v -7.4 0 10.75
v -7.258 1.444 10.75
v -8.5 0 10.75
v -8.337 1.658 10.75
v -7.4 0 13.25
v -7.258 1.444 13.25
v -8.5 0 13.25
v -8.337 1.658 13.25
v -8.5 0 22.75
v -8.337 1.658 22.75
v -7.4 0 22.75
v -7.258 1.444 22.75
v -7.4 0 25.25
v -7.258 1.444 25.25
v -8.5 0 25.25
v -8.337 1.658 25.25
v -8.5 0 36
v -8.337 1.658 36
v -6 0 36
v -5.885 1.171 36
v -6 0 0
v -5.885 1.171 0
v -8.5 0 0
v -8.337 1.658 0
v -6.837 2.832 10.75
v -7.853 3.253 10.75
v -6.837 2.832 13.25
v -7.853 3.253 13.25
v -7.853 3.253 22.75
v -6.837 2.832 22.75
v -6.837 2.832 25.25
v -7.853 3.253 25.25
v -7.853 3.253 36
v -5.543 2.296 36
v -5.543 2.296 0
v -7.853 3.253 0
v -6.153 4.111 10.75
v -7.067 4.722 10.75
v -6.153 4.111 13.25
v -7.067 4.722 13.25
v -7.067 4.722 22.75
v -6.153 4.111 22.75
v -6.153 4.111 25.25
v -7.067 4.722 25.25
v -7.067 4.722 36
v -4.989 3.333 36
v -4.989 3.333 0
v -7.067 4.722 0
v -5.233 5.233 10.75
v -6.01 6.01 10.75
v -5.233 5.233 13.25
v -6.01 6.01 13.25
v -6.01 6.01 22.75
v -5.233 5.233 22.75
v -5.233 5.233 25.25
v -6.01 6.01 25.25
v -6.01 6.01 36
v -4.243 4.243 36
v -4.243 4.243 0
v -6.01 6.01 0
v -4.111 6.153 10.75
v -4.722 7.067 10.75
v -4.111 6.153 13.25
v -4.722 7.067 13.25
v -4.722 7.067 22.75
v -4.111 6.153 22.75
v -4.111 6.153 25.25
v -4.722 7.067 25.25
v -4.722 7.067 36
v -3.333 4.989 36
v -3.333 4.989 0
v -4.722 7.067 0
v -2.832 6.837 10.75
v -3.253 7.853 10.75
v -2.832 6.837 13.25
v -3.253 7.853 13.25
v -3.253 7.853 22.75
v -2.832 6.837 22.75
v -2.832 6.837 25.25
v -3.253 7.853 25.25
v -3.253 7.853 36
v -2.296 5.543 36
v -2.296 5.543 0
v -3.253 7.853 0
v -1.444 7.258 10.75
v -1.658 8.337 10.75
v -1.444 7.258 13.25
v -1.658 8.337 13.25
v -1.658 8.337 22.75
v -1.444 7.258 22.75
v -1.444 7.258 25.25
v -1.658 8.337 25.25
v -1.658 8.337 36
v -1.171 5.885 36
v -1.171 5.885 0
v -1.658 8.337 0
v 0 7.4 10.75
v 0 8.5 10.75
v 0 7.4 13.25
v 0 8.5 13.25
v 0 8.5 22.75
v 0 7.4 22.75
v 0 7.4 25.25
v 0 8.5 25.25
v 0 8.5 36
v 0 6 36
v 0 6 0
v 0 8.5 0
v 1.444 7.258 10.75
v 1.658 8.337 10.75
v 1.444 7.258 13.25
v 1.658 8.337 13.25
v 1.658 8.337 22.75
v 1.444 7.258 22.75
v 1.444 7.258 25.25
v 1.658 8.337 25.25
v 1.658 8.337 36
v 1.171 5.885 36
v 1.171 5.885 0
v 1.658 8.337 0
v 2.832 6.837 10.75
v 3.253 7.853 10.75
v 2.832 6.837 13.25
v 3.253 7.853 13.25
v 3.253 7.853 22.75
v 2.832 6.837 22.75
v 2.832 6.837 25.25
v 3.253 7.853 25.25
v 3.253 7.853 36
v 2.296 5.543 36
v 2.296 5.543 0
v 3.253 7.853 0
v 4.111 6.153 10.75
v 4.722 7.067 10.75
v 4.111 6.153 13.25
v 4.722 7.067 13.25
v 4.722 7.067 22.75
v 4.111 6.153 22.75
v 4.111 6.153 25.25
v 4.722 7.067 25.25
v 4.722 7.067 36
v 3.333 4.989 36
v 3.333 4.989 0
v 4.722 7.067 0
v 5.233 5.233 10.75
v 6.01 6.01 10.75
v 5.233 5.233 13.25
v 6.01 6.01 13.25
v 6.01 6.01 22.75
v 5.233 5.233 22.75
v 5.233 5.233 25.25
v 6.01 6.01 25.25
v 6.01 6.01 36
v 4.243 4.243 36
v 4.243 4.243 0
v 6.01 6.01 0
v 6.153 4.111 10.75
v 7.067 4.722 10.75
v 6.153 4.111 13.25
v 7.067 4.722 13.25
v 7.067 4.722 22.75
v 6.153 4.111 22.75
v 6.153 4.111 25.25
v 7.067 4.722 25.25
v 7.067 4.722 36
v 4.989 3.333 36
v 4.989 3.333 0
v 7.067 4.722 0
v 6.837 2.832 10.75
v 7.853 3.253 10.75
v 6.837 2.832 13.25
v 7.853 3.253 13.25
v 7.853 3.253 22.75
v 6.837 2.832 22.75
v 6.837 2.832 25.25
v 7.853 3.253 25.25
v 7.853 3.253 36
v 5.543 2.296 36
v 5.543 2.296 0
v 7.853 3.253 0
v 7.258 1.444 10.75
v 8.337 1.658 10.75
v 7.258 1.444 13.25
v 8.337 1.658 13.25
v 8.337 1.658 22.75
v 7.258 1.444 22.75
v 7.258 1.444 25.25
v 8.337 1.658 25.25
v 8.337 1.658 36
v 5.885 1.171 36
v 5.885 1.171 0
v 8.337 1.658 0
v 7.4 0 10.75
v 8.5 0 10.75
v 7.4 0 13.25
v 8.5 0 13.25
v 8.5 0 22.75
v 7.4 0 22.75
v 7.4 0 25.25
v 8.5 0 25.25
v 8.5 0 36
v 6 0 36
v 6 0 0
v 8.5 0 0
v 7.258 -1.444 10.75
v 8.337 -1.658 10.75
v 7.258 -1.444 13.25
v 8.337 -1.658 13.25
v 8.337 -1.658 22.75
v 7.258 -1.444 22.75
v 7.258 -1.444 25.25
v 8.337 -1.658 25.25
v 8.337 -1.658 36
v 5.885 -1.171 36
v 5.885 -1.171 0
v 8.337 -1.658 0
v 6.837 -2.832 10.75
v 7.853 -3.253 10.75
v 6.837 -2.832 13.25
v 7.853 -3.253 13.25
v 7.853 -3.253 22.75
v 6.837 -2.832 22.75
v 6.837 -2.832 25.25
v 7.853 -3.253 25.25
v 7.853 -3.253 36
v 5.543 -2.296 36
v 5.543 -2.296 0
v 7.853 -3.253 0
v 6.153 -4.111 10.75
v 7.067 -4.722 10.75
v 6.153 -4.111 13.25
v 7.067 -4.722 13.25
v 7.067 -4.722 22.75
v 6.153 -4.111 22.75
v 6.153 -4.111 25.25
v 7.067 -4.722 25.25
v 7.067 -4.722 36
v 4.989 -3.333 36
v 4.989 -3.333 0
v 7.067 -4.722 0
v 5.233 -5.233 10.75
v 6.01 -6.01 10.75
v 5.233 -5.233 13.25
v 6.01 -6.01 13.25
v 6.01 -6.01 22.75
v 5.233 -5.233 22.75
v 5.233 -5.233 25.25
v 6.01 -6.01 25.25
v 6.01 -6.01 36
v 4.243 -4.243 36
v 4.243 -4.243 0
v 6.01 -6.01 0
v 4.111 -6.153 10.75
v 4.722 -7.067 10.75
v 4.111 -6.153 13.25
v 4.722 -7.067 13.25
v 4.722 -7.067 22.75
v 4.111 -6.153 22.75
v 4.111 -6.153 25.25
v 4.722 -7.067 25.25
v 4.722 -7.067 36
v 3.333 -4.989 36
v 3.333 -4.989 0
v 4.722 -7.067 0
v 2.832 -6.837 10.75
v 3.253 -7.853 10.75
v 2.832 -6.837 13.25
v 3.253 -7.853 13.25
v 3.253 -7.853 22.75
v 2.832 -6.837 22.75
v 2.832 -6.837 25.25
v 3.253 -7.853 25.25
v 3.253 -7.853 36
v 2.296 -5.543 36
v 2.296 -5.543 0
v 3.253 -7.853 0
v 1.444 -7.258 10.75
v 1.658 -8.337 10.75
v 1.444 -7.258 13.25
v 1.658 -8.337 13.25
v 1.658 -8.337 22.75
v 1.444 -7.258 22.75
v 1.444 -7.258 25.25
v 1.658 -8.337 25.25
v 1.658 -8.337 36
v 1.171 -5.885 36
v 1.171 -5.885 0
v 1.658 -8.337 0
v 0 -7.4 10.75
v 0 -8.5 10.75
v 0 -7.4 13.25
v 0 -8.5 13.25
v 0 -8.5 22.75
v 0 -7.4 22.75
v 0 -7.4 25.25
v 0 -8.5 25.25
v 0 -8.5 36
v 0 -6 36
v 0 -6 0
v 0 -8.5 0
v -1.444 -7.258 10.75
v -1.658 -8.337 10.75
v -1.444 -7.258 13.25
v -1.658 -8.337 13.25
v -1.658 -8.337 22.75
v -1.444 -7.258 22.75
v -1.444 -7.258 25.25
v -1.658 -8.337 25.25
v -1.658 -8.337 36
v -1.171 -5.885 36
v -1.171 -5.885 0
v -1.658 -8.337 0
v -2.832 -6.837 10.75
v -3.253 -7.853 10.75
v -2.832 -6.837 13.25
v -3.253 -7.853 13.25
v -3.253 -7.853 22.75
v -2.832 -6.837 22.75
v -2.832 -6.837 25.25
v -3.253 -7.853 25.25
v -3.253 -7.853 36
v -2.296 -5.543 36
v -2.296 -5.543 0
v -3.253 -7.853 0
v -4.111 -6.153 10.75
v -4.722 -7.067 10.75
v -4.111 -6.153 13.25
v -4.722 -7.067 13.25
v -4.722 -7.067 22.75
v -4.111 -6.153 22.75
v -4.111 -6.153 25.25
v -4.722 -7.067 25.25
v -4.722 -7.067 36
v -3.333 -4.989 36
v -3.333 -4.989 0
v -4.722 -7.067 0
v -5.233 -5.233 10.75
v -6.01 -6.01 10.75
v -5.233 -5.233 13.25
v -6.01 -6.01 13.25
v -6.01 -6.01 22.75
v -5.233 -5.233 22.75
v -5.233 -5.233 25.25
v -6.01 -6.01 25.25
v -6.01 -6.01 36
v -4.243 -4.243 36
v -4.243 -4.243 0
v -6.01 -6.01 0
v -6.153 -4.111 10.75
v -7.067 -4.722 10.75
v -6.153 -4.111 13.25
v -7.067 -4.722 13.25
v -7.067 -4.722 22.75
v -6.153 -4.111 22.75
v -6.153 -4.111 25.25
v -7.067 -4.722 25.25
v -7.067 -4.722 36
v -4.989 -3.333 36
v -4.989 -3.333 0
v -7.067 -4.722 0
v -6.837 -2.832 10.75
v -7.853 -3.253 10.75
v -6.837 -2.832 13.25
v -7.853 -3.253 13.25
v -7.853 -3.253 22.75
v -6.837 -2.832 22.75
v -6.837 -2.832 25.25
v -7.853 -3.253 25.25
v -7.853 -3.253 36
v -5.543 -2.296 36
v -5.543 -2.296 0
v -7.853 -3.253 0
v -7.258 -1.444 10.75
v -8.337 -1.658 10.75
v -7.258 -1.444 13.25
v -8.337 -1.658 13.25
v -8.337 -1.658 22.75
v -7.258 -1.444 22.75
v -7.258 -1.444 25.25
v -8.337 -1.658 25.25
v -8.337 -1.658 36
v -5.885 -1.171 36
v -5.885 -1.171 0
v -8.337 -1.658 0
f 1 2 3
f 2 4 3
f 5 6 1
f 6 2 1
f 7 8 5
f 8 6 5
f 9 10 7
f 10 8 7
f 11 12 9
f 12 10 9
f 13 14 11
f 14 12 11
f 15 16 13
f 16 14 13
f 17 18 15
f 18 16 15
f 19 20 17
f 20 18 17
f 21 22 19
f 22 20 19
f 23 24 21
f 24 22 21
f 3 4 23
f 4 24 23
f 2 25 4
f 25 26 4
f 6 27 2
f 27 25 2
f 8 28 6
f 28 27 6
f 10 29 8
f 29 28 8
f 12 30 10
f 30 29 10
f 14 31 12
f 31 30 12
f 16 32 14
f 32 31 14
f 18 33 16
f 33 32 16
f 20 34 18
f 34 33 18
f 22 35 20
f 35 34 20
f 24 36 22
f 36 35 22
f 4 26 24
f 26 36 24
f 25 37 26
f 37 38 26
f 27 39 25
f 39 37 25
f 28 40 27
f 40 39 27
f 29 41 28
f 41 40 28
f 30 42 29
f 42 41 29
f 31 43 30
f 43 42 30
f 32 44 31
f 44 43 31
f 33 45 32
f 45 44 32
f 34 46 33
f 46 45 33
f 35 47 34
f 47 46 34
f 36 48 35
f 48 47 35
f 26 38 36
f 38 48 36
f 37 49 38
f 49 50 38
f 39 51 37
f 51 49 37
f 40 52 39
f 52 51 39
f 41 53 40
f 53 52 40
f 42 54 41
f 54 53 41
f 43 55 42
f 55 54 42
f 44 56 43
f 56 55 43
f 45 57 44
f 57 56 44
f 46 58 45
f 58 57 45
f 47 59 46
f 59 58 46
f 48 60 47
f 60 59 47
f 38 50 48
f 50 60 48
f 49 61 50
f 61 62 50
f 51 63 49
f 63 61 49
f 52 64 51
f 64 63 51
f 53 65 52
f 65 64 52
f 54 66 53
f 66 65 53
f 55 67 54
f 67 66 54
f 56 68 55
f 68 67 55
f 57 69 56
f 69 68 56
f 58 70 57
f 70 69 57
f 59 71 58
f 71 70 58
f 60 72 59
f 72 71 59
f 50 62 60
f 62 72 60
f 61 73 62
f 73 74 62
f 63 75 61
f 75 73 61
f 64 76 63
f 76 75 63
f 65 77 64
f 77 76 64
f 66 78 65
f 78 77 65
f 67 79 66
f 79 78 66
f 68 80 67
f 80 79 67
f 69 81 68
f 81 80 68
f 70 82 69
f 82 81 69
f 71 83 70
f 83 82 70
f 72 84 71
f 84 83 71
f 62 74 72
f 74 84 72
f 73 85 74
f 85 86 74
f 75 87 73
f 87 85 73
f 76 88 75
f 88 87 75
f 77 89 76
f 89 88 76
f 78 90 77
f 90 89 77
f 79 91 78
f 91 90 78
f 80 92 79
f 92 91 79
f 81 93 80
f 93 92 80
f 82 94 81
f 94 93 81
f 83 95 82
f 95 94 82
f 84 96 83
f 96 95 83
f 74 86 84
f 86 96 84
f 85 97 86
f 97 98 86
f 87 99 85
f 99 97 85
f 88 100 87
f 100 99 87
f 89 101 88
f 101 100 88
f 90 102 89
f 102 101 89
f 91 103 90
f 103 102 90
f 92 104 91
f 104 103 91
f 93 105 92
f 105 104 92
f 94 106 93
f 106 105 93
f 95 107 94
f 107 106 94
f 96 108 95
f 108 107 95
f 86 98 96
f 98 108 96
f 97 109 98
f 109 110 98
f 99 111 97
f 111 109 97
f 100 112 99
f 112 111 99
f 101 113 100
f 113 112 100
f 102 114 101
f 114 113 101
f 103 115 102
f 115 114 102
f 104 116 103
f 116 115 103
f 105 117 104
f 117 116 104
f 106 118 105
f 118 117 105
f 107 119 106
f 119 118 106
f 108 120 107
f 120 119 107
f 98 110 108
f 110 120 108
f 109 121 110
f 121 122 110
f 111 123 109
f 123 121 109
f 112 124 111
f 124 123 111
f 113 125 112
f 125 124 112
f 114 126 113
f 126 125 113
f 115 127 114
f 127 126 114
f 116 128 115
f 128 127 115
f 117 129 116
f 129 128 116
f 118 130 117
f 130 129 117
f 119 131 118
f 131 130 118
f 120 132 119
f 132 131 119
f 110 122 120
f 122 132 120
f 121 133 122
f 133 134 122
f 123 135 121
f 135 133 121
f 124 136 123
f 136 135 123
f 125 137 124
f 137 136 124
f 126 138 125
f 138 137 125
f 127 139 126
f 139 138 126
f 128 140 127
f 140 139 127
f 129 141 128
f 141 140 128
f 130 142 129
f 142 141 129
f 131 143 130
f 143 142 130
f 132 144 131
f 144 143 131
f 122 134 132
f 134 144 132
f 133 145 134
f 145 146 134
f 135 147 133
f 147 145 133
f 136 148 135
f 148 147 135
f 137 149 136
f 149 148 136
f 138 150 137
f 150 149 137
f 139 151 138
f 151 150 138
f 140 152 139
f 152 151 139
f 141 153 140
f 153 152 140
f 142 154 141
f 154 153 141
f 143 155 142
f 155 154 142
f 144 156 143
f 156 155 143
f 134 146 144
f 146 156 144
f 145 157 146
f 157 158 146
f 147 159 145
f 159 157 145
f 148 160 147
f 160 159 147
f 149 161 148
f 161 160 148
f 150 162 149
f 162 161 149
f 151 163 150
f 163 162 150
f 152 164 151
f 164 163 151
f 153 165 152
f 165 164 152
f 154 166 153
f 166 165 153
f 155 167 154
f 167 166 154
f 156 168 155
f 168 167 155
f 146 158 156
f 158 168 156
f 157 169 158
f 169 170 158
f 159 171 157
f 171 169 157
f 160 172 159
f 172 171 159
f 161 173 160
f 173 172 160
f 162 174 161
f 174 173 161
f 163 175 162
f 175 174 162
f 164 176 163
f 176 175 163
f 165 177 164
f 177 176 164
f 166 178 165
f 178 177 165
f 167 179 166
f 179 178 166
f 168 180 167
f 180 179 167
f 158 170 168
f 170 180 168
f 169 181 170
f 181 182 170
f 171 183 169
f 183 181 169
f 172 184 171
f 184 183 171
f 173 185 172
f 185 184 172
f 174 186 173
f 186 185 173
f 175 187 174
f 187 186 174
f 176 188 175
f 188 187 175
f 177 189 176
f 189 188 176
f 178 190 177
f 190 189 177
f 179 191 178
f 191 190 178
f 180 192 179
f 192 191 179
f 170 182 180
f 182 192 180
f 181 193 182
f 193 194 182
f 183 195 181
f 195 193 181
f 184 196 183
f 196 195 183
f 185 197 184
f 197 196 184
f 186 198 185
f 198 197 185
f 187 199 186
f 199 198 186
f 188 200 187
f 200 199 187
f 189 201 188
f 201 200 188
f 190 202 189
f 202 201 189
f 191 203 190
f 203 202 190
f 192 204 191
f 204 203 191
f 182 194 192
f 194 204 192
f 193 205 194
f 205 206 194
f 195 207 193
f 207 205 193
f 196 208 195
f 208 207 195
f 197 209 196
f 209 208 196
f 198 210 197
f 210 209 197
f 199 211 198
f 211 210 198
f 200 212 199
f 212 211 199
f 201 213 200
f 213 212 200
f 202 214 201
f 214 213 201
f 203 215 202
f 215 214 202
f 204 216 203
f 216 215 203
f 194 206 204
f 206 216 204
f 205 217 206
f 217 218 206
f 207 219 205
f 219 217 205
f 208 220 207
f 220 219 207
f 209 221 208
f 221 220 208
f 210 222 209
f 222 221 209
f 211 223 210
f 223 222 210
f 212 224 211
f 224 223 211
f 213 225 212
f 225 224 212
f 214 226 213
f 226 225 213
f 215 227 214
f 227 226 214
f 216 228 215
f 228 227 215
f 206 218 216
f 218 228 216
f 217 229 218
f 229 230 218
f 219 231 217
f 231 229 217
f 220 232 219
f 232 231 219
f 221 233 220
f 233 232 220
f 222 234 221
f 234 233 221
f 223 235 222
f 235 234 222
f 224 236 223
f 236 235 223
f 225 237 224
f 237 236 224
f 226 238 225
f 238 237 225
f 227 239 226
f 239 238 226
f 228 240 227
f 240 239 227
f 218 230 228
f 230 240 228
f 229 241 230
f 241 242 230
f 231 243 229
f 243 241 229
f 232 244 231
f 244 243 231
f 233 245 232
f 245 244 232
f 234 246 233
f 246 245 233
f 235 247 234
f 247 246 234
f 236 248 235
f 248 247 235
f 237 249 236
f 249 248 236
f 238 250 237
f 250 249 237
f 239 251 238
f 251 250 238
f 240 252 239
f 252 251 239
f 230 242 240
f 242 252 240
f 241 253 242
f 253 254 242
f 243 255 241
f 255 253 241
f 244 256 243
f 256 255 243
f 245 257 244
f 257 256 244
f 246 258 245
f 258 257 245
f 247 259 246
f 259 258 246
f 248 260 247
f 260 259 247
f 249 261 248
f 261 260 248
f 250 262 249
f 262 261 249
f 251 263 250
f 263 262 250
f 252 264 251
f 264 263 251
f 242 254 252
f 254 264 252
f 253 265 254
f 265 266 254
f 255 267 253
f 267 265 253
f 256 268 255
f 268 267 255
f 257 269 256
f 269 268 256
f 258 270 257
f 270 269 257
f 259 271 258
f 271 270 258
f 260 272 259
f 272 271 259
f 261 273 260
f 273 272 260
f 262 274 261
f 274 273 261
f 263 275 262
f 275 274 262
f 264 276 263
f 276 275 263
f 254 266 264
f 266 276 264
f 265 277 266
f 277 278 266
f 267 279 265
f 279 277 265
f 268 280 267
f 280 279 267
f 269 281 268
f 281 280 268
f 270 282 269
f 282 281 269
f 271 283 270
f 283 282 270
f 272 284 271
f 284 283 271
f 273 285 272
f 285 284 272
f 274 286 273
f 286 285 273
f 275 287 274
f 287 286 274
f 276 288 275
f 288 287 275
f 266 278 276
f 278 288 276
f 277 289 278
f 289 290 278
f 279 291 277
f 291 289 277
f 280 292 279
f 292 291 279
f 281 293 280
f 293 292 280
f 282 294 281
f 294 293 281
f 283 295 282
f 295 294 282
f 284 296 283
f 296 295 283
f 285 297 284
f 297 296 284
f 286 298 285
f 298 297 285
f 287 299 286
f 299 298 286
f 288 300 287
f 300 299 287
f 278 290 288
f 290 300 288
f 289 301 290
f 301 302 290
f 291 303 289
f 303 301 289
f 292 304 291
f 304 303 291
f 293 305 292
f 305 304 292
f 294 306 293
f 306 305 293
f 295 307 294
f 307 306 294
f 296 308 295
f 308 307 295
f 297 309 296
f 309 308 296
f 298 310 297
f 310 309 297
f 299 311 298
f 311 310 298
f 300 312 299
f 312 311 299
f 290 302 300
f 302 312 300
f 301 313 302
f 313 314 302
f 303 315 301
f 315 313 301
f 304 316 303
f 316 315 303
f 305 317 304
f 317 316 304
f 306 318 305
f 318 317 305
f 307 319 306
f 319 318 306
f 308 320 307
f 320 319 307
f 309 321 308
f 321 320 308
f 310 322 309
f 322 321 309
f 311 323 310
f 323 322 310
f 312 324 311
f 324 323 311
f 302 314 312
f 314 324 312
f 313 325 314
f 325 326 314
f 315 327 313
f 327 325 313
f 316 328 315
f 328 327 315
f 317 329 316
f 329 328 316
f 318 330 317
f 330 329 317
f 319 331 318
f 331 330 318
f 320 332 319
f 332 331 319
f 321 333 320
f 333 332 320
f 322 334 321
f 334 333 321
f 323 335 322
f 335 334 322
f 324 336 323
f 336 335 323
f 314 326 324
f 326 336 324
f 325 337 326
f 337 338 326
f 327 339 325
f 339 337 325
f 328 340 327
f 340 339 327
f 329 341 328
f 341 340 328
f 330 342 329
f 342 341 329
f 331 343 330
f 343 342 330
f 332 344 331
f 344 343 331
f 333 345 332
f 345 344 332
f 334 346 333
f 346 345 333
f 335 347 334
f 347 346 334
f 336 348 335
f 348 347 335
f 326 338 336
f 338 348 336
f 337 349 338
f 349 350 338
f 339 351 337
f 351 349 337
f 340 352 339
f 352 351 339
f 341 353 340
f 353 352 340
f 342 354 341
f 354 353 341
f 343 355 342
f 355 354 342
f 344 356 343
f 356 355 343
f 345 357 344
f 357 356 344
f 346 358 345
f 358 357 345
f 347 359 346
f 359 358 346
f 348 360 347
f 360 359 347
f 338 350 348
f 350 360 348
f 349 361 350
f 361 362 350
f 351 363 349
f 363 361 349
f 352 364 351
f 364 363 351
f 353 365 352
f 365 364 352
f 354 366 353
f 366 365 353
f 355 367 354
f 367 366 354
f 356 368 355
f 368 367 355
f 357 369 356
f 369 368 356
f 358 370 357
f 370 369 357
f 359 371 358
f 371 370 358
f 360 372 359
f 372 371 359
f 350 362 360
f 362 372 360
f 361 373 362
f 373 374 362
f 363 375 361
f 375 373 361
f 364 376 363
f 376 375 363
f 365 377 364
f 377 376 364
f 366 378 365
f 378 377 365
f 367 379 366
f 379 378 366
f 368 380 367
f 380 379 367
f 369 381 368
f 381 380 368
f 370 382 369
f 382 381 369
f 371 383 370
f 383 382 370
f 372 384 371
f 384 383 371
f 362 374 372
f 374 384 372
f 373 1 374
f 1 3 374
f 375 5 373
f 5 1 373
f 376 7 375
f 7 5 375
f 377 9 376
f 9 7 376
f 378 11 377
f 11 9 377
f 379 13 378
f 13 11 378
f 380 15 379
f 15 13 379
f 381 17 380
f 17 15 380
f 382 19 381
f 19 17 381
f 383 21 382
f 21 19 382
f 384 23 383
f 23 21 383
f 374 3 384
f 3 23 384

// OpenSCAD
$fn = 32;

// ----------------------------------------------------------------------
// Grooved revolve: plain_grooves, bore R6
// ----------------------------------------------------------------------

// --- parameters (mm) ---
bore_r = 6;               // bore radius
outer_r = 8.5;            // outer radius of the body
total_h = 36;             // overall height, Z
wall = 2.5;               // radial wall thickness
groove_w = 2.5;           // groove width
groove_d = 1.1;           // groove depth
grooves = 2;              // number of outer grooves

bbox_x = 2 * outer_r;  // full diameter
bore_d = 2 * bore_r;  // bore diameter
body_d = 2 * outer_r;  // body diameter
revolve_angle = 360;  // full turn around the Z axis

profile = [[6, 0], [8.5, 0], [8.5, 10.75], [7.4, 10.75], [7.4, 13.25], [8.5, 13.25], [8.5, 22.75], [7.4, 22.75], [7.4, 25.25], [8.5, 25.25], [8.5, 36], [6, 36]];  // primary outline, 12 points, counter clockwise

// --- the one profile operation ---
rotate_extrude(angle = revolve_angle) polygon(points = profile);
